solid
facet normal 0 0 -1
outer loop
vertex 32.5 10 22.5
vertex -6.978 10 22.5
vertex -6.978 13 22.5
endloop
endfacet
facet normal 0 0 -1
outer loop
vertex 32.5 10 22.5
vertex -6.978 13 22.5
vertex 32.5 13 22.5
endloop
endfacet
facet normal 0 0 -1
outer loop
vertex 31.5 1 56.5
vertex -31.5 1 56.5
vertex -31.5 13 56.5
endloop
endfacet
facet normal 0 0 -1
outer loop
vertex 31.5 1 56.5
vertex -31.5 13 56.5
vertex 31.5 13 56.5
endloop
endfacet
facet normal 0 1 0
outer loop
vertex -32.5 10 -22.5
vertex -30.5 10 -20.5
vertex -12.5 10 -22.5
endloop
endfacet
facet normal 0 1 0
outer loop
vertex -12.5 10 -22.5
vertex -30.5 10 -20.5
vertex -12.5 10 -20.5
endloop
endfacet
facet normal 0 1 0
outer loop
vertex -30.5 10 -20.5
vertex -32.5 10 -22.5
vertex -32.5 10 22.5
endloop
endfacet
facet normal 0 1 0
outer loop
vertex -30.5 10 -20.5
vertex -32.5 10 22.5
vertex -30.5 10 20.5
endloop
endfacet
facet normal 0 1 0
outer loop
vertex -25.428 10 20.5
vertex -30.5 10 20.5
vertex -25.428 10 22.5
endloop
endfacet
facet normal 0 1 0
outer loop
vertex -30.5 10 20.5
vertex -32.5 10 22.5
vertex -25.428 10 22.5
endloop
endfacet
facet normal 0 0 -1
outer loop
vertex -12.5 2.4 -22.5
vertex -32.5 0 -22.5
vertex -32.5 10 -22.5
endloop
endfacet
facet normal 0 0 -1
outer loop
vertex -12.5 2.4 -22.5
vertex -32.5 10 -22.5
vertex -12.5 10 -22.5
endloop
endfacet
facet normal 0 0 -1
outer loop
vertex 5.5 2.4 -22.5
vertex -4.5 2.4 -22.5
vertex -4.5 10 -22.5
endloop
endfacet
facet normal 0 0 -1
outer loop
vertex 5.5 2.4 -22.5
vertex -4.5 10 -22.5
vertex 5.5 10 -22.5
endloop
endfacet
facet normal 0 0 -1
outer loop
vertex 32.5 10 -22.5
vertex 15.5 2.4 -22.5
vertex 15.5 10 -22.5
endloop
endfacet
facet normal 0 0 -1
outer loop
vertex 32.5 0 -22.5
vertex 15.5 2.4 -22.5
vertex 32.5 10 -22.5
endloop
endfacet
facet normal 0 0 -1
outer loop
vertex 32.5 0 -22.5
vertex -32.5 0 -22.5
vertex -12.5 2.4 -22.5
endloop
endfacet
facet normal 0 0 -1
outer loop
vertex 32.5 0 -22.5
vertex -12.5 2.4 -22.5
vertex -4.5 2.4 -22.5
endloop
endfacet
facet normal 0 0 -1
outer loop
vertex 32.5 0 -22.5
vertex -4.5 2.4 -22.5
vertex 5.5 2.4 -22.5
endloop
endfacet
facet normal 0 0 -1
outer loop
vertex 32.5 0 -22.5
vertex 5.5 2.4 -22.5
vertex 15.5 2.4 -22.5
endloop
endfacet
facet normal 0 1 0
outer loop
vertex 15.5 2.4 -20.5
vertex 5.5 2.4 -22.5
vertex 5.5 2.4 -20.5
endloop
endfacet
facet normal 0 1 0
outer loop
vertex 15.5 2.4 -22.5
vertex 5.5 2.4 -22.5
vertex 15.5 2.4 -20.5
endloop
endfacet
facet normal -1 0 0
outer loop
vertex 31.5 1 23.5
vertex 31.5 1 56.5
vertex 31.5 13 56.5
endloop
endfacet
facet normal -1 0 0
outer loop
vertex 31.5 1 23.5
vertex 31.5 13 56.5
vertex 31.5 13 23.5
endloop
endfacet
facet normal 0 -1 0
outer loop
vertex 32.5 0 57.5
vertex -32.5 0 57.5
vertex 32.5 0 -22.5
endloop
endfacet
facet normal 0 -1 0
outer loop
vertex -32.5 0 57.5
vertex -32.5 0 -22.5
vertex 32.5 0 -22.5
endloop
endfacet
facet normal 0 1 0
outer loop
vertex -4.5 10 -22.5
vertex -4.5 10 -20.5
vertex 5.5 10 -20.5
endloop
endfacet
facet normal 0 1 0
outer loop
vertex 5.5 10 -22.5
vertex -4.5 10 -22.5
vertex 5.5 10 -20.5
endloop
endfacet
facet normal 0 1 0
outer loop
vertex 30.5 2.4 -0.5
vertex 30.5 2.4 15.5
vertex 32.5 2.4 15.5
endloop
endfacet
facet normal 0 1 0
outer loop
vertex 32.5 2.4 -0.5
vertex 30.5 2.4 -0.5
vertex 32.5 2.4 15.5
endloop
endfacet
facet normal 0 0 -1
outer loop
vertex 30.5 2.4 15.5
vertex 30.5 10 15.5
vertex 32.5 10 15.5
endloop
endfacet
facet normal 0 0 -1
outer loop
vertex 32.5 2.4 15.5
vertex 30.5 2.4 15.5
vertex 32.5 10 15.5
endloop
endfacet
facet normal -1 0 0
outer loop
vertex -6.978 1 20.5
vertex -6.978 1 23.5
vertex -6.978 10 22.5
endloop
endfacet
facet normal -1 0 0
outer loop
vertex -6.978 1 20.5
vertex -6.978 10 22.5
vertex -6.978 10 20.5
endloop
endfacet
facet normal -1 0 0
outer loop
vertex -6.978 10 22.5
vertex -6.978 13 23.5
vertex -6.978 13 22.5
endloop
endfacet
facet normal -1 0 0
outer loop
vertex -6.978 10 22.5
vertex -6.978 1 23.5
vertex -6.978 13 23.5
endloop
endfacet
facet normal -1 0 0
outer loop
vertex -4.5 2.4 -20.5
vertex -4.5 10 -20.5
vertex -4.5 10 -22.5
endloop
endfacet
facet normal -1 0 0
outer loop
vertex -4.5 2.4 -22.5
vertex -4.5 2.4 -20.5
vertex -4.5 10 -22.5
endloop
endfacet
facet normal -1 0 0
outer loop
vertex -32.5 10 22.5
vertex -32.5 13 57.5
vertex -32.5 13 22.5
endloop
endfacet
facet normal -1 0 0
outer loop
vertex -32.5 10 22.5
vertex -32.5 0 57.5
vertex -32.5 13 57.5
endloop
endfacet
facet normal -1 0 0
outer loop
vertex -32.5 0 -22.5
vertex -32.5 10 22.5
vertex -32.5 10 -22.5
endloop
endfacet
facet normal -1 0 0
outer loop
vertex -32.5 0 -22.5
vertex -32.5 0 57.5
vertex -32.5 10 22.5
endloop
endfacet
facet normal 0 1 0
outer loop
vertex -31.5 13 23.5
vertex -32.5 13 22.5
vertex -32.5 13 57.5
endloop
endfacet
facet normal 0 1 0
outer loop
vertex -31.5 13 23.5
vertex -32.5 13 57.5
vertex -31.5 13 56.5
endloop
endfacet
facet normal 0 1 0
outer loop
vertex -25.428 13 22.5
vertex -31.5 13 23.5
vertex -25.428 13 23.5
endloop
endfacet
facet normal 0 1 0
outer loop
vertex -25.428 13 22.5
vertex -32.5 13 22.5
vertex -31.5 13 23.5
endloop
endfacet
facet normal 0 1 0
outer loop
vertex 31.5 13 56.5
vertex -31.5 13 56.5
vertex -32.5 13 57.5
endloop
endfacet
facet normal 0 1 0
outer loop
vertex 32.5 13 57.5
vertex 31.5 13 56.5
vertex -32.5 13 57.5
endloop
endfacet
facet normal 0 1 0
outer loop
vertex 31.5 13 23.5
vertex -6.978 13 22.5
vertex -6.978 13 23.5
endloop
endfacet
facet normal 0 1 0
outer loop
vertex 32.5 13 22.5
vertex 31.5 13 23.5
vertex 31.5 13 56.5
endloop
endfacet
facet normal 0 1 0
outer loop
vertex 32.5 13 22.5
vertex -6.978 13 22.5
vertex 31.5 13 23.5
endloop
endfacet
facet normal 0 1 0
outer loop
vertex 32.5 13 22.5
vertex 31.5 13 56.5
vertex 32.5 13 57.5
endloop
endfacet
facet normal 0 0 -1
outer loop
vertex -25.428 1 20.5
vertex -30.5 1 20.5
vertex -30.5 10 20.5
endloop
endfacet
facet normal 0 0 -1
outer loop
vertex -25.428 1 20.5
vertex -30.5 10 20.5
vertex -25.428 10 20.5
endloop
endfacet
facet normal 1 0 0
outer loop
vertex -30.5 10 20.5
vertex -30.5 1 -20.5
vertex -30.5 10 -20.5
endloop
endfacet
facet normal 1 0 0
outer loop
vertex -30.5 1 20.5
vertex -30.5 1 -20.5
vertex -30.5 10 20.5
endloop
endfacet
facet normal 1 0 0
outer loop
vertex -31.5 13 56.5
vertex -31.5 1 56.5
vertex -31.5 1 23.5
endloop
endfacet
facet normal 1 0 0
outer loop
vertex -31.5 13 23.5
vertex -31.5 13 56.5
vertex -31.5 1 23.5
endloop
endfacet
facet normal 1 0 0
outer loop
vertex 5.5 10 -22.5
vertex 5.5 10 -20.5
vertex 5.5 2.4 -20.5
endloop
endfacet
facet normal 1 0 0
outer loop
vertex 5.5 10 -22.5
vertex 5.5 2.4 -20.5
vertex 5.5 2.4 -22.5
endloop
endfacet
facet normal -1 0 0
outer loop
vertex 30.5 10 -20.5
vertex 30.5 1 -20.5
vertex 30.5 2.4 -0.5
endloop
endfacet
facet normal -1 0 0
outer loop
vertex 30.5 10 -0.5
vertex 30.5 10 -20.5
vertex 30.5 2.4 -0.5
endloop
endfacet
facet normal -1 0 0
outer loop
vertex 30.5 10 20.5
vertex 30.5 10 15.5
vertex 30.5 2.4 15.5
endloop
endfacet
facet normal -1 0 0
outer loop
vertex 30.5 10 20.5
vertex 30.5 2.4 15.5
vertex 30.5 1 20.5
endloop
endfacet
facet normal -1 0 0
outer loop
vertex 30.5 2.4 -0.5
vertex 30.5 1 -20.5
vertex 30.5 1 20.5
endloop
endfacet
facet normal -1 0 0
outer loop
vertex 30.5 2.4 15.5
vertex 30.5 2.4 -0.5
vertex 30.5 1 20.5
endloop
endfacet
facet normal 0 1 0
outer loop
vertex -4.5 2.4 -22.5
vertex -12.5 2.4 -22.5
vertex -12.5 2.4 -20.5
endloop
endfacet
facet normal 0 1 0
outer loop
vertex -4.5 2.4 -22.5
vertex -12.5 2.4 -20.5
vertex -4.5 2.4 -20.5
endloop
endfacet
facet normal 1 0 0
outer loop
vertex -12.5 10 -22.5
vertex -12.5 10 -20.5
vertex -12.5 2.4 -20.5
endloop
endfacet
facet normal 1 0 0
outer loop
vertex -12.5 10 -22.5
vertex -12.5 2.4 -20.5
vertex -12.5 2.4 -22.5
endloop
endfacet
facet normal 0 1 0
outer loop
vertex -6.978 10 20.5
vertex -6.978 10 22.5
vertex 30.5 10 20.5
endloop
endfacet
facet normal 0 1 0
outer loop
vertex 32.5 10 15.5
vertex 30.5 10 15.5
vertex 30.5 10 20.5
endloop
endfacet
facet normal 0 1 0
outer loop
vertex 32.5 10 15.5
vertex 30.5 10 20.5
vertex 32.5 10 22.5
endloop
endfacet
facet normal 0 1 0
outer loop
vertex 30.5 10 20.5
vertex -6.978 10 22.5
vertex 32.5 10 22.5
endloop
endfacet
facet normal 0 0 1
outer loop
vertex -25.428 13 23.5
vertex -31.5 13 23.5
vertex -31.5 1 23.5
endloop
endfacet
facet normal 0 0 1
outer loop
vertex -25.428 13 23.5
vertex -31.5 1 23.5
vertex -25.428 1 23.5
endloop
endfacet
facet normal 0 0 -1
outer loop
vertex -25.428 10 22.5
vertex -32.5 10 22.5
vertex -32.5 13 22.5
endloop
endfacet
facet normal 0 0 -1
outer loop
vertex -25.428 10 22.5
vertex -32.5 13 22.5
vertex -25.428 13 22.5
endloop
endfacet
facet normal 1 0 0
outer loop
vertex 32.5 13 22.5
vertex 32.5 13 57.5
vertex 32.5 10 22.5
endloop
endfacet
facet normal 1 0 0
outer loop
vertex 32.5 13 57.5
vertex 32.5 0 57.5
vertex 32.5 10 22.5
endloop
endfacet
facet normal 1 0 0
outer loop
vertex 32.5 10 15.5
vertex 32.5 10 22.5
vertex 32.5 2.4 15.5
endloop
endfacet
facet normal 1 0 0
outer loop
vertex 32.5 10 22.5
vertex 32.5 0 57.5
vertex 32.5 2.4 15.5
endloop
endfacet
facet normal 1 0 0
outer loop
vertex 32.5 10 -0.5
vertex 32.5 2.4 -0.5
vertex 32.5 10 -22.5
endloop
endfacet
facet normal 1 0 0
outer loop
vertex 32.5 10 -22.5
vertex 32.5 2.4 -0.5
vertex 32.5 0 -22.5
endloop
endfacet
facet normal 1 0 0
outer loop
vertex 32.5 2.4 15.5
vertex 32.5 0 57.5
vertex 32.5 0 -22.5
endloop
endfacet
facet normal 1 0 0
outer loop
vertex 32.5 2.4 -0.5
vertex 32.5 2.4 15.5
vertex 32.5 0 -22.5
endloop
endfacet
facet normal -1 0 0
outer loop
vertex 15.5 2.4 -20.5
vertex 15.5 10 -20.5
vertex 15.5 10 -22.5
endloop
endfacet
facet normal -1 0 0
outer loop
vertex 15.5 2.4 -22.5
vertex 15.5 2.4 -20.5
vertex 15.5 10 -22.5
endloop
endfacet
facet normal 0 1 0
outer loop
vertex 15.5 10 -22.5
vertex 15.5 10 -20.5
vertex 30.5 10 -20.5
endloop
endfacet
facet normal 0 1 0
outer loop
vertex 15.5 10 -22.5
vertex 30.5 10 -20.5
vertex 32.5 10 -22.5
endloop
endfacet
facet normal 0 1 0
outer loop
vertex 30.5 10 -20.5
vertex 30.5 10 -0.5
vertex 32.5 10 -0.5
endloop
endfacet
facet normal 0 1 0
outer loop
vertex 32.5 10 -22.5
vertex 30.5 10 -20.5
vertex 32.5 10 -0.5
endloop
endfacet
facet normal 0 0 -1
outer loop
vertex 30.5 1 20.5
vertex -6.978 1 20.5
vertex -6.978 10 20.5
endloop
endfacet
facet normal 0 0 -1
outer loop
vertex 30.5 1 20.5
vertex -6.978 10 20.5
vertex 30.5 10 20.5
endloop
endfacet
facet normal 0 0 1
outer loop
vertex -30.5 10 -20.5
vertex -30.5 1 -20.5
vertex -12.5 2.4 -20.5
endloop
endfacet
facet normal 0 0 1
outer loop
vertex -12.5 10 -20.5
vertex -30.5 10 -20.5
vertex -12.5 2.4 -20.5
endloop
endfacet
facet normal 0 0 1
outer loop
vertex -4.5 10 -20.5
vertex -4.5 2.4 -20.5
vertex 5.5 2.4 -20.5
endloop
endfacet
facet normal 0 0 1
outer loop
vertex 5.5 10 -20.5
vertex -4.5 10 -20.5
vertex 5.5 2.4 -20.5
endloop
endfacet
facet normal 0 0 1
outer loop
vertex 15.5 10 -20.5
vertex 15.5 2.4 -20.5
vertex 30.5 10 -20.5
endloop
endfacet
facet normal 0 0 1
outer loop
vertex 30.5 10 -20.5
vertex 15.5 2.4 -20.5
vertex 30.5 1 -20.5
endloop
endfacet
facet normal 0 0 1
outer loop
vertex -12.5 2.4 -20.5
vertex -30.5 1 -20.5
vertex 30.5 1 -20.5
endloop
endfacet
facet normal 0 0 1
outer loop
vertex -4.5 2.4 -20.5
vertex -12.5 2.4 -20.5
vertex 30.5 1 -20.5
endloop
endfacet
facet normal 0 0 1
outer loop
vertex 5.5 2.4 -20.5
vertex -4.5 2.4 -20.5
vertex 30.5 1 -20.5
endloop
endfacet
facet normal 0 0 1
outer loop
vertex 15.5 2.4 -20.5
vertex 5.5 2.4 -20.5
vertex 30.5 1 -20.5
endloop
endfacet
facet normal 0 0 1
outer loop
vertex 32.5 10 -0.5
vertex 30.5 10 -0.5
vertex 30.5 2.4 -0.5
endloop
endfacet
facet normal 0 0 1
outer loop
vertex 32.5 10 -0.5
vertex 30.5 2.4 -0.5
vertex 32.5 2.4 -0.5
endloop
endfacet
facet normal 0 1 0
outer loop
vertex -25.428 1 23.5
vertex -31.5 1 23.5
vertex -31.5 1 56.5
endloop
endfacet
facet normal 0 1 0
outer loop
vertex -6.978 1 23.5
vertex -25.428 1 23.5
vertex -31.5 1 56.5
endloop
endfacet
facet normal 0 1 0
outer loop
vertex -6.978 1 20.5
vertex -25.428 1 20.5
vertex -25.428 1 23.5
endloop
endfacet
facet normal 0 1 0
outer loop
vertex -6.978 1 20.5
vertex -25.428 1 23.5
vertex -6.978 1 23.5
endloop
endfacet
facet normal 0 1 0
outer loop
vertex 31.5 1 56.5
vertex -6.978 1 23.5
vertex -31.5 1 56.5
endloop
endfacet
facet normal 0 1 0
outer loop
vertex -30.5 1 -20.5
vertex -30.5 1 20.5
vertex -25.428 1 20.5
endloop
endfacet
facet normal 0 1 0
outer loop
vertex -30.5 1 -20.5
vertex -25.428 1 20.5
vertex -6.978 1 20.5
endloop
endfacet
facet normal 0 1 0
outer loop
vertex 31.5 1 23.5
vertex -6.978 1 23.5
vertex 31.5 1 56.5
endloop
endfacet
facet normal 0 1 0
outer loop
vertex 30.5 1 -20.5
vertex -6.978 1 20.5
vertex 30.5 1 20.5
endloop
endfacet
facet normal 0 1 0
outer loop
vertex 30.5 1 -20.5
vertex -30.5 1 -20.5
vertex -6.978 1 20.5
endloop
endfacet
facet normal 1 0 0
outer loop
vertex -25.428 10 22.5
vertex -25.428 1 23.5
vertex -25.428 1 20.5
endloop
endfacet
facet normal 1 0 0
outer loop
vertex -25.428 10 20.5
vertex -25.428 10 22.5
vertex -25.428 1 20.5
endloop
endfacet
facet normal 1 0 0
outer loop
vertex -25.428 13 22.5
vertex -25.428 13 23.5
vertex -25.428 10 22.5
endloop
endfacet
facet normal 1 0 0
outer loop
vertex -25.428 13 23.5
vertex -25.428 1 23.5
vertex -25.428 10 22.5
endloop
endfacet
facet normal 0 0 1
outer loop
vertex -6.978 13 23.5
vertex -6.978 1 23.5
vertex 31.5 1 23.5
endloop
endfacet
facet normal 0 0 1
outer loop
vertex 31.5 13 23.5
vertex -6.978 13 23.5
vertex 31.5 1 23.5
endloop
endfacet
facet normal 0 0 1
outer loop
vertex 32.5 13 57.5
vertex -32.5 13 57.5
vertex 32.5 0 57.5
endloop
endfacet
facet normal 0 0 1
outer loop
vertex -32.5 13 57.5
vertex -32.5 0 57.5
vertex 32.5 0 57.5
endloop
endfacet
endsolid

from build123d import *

# Parameters (mm, degrees)
SKETCH1_W           = 61
SKETCH1_H           = 41
BOSS_EXTRUDE1_DEPTH = 1
SKETCH2_W           = 65
SKETCH2_H           = 45
SKETCH2_W_2         = 61
SKETCH2_H_2         = 41
BOSS_EXTRUDE2_DEPTH = 10
SKETCH3_W           = 8
SKETCH3_H           = 2
SKETCH3_W_2         = 10
SKETCH3_W_3         = 2
SKETCH3_H_2         = 16
CUT_EXTRUDE1_DEPTH  = 7.6
SKETCH4_W           = 65
SKETCH4_H           = 1
BOSS_EXTRUDE3_DEPTH = 35
SKETCH5_W           = 65
SKETCH5_H           = 35
SKETCH5_W_2         = 63
SKETCH5_H_2         = 33
BOSS_EXTRUDE4_DEPTH = 12
CUT_EXTRUDE2_REACH  = 69.316
SKETCH6_W           = 18.450763423
SKETCH6_H           = 7.617543819


with BuildPart() as part:
    # Sketch1 → Boss-Extrude1 (new body)
    with BuildSketch(Plane(origin=(0, 0, 0), x_dir=(1, 0, 0), z_dir=(0, 1, 0))):
        Rectangle(SKETCH1_W, SKETCH1_H)
    extrude(amount=BOSS_EXTRUDE1_DEPTH)

    # Sketch2 → Boss-Extrude2 (add)
    with BuildSketch(Plane.XZ):
        Rectangle(SKETCH2_W, SKETCH2_H)
        Rectangle(SKETCH2_W_2, SKETCH2_H_2, mode=Mode.SUBTRACT)
    extrude(amount=-BOSS_EXTRUDE2_DEPTH)

    # Sketch3 → Cut-Extrude1 (cut)
    with BuildSketch(Plane(origin=(0, 10, 0), x_dir=(1, 0, 0), z_dir=(0, 1, 0))):
        with Locations((-8.5, 21.5)):
            Rectangle(SKETCH3_W, SKETCH3_H)
        with Locations((10.5, 21.5)):
            Rectangle(SKETCH3_W_2, SKETCH3_H)
        with Locations((31.5, -7.5)):
            Rectangle(SKETCH3_W_3, SKETCH3_H_2)
    extrude(amount=-CUT_EXTRUDE1_DEPTH, mode=Mode.SUBTRACT)

    # Sketch4 → Boss-Extrude3 (add)
    with BuildSketch(Plane.XY.offset(22.5)):
        with Locations((0, 0.5)):
            Rectangle(SKETCH4_W, SKETCH4_H)
    extrude(amount=BOSS_EXTRUDE3_DEPTH)

    # Sketch5 → Boss-Extrude4 (add)
    with BuildSketch(Plane(origin=(0, 1, 0), x_dir=(1, 0, 0), z_dir=(0, 1, 0))):
        with Locations((0, -40)):
            Rectangle(SKETCH5_W, SKETCH5_H)
        with Locations((0, -40)):
            Rectangle(SKETCH5_W_2, SKETCH5_H_2, mode=Mode.SUBTRACT)
    extrude(amount=BOSS_EXTRUDE4_DEPTH)

    # Cut-Extrude2: up to this face of the body (flat: up to its plane)
    cut_extrude2_end = Plane(part.part.faces().sort_by_distance((0, 1, 40))[0])
    # Sketch6 → Cut-Extrude2 (cut, up to the picked face)
    with BuildSketch(Plane(origin=(0, 13, 0), x_dir=(1, 0, 0), z_dir=(0, 1, 0)), mode=Mode.PRIVATE) as cut_extrude2_sk1:
        with Locations((-16.202920441, -19.691228091)):
            Rectangle(SKETCH6_W, SKETCH6_H)
    cut_extrude2_tool1 = split(extrude(cut_extrude2_sk1.sketch, amount=-CUT_EXTRUDE2_REACH, mode=Mode.PRIVATE), bisect_by=cut_extrude2_end, keep=Keep.BOTH, mode=Mode.PRIVATE)
    add(cut_extrude2_tool1.solids().sort_by(Axis((-16.20292, 13, 19.691228), (0, -1, 0)))[0], mode=Mode.SUBTRACT)


solid = part.part
